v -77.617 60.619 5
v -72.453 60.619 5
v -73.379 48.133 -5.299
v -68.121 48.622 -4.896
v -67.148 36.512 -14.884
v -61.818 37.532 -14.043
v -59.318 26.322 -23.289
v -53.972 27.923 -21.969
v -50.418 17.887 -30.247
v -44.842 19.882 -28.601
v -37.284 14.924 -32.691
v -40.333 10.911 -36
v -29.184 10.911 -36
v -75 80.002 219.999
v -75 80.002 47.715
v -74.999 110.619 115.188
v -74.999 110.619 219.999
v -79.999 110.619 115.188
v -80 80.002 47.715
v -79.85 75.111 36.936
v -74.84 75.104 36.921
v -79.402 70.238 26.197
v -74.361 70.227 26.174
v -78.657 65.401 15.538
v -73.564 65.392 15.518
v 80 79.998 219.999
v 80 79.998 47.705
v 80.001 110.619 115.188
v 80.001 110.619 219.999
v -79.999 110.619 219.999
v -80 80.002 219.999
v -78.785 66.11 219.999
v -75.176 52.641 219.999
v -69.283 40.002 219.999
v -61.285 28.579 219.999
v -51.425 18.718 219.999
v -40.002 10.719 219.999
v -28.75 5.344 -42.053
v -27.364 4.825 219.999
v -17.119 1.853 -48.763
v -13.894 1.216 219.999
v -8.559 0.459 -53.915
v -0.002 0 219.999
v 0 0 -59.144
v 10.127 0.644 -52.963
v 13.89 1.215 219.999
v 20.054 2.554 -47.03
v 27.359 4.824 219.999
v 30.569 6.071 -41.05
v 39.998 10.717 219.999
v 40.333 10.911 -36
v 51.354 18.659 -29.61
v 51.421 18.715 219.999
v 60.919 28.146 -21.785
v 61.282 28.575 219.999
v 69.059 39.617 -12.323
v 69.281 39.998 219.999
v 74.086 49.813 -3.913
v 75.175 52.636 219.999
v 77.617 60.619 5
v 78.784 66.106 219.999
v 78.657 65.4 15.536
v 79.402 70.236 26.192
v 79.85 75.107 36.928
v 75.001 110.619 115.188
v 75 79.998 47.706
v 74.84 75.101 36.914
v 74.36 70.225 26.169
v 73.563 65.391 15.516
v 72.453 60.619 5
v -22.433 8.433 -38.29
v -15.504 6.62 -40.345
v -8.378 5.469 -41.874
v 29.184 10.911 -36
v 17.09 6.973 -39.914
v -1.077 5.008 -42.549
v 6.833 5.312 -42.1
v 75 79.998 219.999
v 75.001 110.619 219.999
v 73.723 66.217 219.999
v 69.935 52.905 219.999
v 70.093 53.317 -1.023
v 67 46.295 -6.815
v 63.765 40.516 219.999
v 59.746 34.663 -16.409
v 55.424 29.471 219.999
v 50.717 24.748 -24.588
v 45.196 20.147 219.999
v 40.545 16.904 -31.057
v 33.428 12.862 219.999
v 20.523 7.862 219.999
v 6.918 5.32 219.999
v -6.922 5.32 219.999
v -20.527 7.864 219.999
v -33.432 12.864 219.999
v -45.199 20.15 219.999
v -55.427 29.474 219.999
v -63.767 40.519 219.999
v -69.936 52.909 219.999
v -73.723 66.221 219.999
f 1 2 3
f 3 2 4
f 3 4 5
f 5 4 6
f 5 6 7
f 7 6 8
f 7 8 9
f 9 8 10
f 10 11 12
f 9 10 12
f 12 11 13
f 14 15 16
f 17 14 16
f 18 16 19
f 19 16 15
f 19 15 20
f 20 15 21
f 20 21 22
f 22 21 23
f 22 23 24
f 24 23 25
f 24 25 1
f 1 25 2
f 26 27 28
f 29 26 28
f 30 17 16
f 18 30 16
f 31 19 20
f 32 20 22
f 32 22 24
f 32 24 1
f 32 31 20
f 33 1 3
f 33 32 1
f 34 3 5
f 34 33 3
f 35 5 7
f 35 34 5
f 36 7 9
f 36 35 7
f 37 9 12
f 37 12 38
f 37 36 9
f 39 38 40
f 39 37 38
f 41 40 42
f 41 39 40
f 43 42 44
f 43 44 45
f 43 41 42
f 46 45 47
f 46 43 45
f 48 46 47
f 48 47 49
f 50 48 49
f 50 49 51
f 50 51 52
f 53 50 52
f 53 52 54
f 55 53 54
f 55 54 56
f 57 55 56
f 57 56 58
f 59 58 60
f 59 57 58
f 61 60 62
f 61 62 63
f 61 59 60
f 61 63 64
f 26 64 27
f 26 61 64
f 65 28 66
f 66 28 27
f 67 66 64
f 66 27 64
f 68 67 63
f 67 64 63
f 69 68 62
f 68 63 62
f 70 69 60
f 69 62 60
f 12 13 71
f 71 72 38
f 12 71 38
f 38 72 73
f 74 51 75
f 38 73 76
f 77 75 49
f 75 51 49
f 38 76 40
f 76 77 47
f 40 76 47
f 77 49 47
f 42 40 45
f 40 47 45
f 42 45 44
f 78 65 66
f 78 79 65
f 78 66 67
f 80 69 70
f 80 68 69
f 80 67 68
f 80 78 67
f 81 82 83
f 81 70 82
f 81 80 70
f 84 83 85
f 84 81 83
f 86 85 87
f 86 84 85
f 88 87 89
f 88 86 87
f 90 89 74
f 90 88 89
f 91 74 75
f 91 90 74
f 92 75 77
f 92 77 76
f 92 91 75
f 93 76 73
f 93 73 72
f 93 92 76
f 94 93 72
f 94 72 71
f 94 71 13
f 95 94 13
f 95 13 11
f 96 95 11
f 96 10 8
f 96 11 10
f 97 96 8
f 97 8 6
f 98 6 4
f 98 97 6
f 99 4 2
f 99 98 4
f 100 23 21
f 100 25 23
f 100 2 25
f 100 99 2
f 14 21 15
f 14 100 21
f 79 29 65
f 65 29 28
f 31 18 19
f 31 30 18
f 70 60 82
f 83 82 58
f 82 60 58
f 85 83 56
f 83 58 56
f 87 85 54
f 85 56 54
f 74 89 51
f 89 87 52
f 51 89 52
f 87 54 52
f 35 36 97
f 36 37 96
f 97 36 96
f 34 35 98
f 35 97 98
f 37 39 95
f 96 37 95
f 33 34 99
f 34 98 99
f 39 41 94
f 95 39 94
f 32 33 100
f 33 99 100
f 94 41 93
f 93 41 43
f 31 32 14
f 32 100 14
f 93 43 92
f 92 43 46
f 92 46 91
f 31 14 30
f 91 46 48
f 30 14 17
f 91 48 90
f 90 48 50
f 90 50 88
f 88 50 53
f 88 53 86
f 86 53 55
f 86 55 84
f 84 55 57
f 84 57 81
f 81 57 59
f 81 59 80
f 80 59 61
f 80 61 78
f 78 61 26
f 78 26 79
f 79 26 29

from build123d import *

# Parameters (mm, degrees)
F1_DEPTH = 270
F3_DEPTH = 250


with BuildPart() as f1:
    # F0 (on Top) → F1 (new body, symmetric)
    with BuildSketch(Plane.XY):
        with BuildLine():
            Line((79.9999999672, 79.9977099118), (80.0017351981, 140.6147968648))
            Line((80.0017351981, 140.6147968648), (75.0017352002, 140.6149399953))
            Line((75.0017352002, 140.6149399953), (74.9999999686, 79.9978290345))
            ThreePointArc((74.9999999686, 79.9978290345), (-0.0021469583, 4.9999760229), (-74.99999997, 80.0021229498))
            Line((-74.99999997, 80.0021229498), (-74.9982647384, 140.6192339106))
            Line((-74.9982647384, 140.6192339106), (-79.9982647363, 140.6193770411))
            Line((-79.9982647363, 140.6193770411), (-79.9999999672, 80.0022900882))
            ThreePointArc((-79.9999999672, 80.0022900882), (-0.0022900882, 3.28e-08), (79.9999999672, 79.9977099118))
        make_face()
    extrude(amount=F1_DEPTH, both=True)

    # F2 (on Right) → F3 (cut, symmetric)
    with BuildSketch(Plane.YZ):
        with BuildLine():
            Line((140.6193770411, -270), (140.6193770411, 270))
            Line((140.6193770411, 270), (0, 270))
            Line((0, 270), (0, 219.99933))
            Line((0, 219.99933), (110.6193770411, 219.99933))
            Line((110.6193770411, 219.99933), (110.6193770411, 115.1882235752))
            Line((110.6193770411, 115.1882235752), (60.6193770411, 5))
            Line((60.6193770411, 5), (10.9110071197, -36.0003965298))
            ThreePointArc((10.9110071197, -36.0003965298), (2.8645086058, -46.3504872547), (0, -59.1436536647))
            Line((0, -59.1436536647), (0, -270))
            Line((0, -270), (140.6193770411, -270))
        make_face()
    extrude(amount=F3_DEPTH, both=True, mode=Mode.SUBTRACT)


solid = f1.part
